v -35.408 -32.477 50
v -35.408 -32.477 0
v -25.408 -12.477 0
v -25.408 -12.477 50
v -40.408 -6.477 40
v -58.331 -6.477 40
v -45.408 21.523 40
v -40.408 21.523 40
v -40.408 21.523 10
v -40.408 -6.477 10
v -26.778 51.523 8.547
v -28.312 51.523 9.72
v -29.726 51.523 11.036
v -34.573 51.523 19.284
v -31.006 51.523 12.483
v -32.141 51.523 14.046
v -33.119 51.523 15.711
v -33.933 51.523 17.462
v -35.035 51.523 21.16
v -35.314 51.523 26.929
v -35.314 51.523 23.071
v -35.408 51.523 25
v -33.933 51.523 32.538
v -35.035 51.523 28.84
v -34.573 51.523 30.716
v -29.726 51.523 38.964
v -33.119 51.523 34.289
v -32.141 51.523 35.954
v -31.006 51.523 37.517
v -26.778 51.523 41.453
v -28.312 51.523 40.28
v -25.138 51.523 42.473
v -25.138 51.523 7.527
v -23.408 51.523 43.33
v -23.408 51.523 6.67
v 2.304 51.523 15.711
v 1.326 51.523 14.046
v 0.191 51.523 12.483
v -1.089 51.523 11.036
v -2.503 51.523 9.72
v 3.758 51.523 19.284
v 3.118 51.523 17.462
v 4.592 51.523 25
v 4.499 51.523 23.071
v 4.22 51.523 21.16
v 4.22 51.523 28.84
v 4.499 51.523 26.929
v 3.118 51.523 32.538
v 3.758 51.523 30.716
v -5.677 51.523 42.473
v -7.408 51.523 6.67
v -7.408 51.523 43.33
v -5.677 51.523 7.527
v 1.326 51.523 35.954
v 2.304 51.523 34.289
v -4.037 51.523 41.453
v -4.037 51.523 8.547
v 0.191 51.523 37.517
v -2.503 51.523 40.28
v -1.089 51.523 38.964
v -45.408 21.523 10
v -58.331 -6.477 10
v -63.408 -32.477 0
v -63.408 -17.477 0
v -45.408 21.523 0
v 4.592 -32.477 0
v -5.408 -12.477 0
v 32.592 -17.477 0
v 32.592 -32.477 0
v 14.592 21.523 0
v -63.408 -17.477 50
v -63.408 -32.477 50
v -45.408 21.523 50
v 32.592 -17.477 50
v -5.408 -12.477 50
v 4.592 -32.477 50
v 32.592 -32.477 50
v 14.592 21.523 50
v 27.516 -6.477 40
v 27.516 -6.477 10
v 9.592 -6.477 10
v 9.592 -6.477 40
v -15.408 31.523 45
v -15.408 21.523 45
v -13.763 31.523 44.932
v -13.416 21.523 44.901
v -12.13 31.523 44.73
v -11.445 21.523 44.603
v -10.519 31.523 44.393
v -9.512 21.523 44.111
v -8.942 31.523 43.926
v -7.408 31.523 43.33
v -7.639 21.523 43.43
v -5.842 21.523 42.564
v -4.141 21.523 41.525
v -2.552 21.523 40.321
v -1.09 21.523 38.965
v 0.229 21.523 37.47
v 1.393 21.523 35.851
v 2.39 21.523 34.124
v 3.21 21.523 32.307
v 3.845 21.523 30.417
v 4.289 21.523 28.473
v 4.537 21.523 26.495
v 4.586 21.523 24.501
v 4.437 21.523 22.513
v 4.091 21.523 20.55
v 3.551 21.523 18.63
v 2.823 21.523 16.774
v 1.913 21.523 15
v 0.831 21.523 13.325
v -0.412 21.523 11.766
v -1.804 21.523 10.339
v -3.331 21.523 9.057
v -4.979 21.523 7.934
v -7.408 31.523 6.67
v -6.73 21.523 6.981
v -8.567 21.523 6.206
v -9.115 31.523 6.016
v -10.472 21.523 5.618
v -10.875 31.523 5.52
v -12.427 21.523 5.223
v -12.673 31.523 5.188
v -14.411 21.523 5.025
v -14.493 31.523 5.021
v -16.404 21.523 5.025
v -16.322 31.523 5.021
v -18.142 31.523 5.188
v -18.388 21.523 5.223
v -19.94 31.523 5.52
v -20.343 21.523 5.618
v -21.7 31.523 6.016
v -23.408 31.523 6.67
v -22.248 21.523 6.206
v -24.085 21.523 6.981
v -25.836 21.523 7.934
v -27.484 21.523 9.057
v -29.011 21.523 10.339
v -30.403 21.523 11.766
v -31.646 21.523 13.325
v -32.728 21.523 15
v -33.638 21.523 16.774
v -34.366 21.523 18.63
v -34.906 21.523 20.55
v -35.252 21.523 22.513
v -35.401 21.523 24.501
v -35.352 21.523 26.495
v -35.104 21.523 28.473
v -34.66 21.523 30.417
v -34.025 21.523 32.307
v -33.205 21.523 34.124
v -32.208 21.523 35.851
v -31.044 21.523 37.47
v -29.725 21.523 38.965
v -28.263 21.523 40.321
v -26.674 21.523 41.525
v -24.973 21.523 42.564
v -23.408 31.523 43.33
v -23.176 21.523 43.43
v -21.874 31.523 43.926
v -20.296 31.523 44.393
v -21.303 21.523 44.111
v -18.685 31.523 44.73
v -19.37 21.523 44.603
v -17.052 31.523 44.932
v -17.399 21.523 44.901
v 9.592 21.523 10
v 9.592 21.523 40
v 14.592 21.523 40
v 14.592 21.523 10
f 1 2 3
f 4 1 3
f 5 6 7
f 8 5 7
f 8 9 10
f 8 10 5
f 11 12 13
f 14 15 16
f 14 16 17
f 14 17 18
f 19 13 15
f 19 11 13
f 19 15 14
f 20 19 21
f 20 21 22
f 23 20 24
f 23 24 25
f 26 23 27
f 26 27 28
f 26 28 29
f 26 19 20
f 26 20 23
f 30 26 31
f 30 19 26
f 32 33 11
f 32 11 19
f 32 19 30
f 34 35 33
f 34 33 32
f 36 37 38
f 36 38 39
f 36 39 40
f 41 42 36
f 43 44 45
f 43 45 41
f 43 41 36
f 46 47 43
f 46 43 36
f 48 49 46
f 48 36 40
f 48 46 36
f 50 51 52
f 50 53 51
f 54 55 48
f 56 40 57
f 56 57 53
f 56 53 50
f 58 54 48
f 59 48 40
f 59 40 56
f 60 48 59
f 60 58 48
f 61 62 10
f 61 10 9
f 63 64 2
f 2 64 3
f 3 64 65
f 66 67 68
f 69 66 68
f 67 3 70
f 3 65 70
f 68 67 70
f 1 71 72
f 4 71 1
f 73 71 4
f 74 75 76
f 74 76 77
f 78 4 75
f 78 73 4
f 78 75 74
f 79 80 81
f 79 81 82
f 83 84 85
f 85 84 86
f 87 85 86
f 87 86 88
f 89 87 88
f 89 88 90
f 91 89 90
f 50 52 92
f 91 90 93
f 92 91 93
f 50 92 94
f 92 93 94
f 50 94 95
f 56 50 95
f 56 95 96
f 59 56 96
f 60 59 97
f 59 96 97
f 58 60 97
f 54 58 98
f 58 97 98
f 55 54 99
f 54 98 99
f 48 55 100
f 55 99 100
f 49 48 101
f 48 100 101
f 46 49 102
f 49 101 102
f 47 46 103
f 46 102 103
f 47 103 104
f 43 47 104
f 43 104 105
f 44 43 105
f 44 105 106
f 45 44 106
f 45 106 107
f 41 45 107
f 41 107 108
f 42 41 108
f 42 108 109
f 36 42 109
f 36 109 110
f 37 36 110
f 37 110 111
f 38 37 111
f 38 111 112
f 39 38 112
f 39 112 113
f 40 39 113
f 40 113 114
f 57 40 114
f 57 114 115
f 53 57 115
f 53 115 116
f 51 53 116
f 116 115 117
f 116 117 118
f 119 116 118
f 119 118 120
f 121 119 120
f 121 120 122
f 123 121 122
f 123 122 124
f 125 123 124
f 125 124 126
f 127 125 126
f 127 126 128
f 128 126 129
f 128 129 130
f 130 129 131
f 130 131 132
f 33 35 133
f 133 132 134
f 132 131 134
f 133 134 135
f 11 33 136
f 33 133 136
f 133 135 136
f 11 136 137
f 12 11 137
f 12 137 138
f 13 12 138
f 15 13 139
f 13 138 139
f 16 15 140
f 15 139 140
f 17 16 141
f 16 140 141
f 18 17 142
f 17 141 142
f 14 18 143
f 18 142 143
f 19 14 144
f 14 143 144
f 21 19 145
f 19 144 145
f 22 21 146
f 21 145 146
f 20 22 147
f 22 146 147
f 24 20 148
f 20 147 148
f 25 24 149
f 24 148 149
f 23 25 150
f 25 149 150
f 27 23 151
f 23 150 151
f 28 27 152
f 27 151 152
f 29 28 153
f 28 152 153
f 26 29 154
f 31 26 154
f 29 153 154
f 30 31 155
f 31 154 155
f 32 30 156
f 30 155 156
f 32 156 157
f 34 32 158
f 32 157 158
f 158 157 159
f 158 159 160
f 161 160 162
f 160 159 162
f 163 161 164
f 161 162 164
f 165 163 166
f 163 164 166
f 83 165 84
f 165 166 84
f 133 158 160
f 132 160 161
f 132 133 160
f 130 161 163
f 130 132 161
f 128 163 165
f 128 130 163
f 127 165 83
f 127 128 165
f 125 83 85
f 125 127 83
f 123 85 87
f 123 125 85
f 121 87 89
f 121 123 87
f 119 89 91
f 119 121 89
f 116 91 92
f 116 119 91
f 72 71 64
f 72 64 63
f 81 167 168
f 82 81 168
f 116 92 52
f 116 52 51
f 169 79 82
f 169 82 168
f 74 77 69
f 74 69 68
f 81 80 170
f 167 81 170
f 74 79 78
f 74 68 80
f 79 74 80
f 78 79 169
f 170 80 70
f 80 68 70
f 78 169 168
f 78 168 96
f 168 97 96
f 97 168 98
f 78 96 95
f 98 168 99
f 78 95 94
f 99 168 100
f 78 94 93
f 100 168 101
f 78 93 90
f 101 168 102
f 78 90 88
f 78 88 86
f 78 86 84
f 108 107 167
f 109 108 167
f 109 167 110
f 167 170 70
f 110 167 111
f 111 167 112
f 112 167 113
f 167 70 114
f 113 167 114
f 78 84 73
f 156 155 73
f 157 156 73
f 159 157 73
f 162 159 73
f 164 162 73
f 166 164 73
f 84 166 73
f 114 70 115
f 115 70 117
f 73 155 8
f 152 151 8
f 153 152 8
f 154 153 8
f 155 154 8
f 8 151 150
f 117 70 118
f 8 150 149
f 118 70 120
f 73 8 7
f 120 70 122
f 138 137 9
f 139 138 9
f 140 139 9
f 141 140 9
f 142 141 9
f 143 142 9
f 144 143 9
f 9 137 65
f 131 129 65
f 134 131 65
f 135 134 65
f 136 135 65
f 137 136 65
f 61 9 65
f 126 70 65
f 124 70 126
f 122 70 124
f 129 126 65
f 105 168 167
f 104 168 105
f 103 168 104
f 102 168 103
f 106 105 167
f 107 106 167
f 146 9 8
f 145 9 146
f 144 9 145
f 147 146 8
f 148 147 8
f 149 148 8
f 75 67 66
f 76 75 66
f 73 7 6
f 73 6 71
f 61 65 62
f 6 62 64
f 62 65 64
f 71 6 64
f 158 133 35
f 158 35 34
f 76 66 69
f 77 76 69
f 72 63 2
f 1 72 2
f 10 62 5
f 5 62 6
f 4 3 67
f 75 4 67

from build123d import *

# Parameters (mm, degrees)
BOSS_EXTRUDE1_DEPTH = 50
SKETCH2_R           = 20
BOSS_EXTRUDE2_DEPTH = 30
CUT_EXTRUDE1_START  = -20
CUT_EXTRUDE1_DEPTH  = 20
SKETCH4_W           = 30
SKETCH4_H           = 28
CUT_EXTRUDE2_DEPTH  = 23


with BuildPart() as part:
    # Sketch1 → Boss-Extrude1 (new body)
    with BuildSketch(Plane.XY):
        Polygon((14.59247247, 21.522973704), (-45.40752753, 21.522973704), (-63.40752753, -17.477026296), (-63.40752753, -32.477026296), (-35.40752753, -32.477026296), (-25.40752753, -12.477026296), (-5.40752753, -12.477026296), (4.59247247, -32.477026296), (32.59247247, -32.477026296), (32.59247247, -17.477026296), align=None)
    extrude(amount=BOSS_EXTRUDE1_DEPTH)

    # Sketch2 → Boss-Extrude2 (add)
    with BuildSketch(Plane(origin=(0, 21.522973704, 0), x_dir=(1, 0, 0), z_dir=(0, 1, 0))):
        with Locations(Location((-15.40752753, -25, 0), (0, 0, 270))):
            Circle(SKETCH2_R)
    extrude(amount=BOSS_EXTRUDE2_DEPTH)

    # Sketch3 → Cut-Extrude1 (cut)
    with BuildSketch(Plane(origin=(0, 51.522973704, 0), x_dir=(1, 0, 0), z_dir=(0, 1, 0)).offset(CUT_EXTRUDE1_START)):
        with BuildLine():
            Line((-7.40752753, -25), (-7.40752753, -6.66969722))
            ThreePointArc((-7.40752753, -6.66969722), (-15.40752753, -5), (-23.40752753, -6.66969722))
            Line((-23.40752753, -6.66969722), (-23.40752753, -43.33030278))
            ThreePointArc((-23.40752753, -43.33030278), (-15.40752753, -45), (-7.40752753, -43.33030278))
            Line((-7.40752753, -43.33030278), (-7.40752753, -25))
        make_face()
    extrude(amount=CUT_EXTRUDE1_DEPTH, mode=Mode.SUBTRACT)

    # Sketch4 → Cut-Extrude2 (cut)
    with BuildSketch(Plane.ZY.offset(63.40752753)):
        with Locations((25, 7.522973704)):
            Rectangle(SKETCH4_W, SKETCH4_H)
    cut_extrude2 = extrude(amount=-CUT_EXTRUDE2_DEPTH, mode=Mode.SUBTRACT)

    # Mirror1: Cut-Extrude2 across plane
    add(cut_extrude2.mirror(Plane(origin=(-15.40752753, 0, 0), x_dir=(0, 0, 1), z_dir=(1, 0, 0))), mode=Mode.SUBTRACT)


solid = part.part
